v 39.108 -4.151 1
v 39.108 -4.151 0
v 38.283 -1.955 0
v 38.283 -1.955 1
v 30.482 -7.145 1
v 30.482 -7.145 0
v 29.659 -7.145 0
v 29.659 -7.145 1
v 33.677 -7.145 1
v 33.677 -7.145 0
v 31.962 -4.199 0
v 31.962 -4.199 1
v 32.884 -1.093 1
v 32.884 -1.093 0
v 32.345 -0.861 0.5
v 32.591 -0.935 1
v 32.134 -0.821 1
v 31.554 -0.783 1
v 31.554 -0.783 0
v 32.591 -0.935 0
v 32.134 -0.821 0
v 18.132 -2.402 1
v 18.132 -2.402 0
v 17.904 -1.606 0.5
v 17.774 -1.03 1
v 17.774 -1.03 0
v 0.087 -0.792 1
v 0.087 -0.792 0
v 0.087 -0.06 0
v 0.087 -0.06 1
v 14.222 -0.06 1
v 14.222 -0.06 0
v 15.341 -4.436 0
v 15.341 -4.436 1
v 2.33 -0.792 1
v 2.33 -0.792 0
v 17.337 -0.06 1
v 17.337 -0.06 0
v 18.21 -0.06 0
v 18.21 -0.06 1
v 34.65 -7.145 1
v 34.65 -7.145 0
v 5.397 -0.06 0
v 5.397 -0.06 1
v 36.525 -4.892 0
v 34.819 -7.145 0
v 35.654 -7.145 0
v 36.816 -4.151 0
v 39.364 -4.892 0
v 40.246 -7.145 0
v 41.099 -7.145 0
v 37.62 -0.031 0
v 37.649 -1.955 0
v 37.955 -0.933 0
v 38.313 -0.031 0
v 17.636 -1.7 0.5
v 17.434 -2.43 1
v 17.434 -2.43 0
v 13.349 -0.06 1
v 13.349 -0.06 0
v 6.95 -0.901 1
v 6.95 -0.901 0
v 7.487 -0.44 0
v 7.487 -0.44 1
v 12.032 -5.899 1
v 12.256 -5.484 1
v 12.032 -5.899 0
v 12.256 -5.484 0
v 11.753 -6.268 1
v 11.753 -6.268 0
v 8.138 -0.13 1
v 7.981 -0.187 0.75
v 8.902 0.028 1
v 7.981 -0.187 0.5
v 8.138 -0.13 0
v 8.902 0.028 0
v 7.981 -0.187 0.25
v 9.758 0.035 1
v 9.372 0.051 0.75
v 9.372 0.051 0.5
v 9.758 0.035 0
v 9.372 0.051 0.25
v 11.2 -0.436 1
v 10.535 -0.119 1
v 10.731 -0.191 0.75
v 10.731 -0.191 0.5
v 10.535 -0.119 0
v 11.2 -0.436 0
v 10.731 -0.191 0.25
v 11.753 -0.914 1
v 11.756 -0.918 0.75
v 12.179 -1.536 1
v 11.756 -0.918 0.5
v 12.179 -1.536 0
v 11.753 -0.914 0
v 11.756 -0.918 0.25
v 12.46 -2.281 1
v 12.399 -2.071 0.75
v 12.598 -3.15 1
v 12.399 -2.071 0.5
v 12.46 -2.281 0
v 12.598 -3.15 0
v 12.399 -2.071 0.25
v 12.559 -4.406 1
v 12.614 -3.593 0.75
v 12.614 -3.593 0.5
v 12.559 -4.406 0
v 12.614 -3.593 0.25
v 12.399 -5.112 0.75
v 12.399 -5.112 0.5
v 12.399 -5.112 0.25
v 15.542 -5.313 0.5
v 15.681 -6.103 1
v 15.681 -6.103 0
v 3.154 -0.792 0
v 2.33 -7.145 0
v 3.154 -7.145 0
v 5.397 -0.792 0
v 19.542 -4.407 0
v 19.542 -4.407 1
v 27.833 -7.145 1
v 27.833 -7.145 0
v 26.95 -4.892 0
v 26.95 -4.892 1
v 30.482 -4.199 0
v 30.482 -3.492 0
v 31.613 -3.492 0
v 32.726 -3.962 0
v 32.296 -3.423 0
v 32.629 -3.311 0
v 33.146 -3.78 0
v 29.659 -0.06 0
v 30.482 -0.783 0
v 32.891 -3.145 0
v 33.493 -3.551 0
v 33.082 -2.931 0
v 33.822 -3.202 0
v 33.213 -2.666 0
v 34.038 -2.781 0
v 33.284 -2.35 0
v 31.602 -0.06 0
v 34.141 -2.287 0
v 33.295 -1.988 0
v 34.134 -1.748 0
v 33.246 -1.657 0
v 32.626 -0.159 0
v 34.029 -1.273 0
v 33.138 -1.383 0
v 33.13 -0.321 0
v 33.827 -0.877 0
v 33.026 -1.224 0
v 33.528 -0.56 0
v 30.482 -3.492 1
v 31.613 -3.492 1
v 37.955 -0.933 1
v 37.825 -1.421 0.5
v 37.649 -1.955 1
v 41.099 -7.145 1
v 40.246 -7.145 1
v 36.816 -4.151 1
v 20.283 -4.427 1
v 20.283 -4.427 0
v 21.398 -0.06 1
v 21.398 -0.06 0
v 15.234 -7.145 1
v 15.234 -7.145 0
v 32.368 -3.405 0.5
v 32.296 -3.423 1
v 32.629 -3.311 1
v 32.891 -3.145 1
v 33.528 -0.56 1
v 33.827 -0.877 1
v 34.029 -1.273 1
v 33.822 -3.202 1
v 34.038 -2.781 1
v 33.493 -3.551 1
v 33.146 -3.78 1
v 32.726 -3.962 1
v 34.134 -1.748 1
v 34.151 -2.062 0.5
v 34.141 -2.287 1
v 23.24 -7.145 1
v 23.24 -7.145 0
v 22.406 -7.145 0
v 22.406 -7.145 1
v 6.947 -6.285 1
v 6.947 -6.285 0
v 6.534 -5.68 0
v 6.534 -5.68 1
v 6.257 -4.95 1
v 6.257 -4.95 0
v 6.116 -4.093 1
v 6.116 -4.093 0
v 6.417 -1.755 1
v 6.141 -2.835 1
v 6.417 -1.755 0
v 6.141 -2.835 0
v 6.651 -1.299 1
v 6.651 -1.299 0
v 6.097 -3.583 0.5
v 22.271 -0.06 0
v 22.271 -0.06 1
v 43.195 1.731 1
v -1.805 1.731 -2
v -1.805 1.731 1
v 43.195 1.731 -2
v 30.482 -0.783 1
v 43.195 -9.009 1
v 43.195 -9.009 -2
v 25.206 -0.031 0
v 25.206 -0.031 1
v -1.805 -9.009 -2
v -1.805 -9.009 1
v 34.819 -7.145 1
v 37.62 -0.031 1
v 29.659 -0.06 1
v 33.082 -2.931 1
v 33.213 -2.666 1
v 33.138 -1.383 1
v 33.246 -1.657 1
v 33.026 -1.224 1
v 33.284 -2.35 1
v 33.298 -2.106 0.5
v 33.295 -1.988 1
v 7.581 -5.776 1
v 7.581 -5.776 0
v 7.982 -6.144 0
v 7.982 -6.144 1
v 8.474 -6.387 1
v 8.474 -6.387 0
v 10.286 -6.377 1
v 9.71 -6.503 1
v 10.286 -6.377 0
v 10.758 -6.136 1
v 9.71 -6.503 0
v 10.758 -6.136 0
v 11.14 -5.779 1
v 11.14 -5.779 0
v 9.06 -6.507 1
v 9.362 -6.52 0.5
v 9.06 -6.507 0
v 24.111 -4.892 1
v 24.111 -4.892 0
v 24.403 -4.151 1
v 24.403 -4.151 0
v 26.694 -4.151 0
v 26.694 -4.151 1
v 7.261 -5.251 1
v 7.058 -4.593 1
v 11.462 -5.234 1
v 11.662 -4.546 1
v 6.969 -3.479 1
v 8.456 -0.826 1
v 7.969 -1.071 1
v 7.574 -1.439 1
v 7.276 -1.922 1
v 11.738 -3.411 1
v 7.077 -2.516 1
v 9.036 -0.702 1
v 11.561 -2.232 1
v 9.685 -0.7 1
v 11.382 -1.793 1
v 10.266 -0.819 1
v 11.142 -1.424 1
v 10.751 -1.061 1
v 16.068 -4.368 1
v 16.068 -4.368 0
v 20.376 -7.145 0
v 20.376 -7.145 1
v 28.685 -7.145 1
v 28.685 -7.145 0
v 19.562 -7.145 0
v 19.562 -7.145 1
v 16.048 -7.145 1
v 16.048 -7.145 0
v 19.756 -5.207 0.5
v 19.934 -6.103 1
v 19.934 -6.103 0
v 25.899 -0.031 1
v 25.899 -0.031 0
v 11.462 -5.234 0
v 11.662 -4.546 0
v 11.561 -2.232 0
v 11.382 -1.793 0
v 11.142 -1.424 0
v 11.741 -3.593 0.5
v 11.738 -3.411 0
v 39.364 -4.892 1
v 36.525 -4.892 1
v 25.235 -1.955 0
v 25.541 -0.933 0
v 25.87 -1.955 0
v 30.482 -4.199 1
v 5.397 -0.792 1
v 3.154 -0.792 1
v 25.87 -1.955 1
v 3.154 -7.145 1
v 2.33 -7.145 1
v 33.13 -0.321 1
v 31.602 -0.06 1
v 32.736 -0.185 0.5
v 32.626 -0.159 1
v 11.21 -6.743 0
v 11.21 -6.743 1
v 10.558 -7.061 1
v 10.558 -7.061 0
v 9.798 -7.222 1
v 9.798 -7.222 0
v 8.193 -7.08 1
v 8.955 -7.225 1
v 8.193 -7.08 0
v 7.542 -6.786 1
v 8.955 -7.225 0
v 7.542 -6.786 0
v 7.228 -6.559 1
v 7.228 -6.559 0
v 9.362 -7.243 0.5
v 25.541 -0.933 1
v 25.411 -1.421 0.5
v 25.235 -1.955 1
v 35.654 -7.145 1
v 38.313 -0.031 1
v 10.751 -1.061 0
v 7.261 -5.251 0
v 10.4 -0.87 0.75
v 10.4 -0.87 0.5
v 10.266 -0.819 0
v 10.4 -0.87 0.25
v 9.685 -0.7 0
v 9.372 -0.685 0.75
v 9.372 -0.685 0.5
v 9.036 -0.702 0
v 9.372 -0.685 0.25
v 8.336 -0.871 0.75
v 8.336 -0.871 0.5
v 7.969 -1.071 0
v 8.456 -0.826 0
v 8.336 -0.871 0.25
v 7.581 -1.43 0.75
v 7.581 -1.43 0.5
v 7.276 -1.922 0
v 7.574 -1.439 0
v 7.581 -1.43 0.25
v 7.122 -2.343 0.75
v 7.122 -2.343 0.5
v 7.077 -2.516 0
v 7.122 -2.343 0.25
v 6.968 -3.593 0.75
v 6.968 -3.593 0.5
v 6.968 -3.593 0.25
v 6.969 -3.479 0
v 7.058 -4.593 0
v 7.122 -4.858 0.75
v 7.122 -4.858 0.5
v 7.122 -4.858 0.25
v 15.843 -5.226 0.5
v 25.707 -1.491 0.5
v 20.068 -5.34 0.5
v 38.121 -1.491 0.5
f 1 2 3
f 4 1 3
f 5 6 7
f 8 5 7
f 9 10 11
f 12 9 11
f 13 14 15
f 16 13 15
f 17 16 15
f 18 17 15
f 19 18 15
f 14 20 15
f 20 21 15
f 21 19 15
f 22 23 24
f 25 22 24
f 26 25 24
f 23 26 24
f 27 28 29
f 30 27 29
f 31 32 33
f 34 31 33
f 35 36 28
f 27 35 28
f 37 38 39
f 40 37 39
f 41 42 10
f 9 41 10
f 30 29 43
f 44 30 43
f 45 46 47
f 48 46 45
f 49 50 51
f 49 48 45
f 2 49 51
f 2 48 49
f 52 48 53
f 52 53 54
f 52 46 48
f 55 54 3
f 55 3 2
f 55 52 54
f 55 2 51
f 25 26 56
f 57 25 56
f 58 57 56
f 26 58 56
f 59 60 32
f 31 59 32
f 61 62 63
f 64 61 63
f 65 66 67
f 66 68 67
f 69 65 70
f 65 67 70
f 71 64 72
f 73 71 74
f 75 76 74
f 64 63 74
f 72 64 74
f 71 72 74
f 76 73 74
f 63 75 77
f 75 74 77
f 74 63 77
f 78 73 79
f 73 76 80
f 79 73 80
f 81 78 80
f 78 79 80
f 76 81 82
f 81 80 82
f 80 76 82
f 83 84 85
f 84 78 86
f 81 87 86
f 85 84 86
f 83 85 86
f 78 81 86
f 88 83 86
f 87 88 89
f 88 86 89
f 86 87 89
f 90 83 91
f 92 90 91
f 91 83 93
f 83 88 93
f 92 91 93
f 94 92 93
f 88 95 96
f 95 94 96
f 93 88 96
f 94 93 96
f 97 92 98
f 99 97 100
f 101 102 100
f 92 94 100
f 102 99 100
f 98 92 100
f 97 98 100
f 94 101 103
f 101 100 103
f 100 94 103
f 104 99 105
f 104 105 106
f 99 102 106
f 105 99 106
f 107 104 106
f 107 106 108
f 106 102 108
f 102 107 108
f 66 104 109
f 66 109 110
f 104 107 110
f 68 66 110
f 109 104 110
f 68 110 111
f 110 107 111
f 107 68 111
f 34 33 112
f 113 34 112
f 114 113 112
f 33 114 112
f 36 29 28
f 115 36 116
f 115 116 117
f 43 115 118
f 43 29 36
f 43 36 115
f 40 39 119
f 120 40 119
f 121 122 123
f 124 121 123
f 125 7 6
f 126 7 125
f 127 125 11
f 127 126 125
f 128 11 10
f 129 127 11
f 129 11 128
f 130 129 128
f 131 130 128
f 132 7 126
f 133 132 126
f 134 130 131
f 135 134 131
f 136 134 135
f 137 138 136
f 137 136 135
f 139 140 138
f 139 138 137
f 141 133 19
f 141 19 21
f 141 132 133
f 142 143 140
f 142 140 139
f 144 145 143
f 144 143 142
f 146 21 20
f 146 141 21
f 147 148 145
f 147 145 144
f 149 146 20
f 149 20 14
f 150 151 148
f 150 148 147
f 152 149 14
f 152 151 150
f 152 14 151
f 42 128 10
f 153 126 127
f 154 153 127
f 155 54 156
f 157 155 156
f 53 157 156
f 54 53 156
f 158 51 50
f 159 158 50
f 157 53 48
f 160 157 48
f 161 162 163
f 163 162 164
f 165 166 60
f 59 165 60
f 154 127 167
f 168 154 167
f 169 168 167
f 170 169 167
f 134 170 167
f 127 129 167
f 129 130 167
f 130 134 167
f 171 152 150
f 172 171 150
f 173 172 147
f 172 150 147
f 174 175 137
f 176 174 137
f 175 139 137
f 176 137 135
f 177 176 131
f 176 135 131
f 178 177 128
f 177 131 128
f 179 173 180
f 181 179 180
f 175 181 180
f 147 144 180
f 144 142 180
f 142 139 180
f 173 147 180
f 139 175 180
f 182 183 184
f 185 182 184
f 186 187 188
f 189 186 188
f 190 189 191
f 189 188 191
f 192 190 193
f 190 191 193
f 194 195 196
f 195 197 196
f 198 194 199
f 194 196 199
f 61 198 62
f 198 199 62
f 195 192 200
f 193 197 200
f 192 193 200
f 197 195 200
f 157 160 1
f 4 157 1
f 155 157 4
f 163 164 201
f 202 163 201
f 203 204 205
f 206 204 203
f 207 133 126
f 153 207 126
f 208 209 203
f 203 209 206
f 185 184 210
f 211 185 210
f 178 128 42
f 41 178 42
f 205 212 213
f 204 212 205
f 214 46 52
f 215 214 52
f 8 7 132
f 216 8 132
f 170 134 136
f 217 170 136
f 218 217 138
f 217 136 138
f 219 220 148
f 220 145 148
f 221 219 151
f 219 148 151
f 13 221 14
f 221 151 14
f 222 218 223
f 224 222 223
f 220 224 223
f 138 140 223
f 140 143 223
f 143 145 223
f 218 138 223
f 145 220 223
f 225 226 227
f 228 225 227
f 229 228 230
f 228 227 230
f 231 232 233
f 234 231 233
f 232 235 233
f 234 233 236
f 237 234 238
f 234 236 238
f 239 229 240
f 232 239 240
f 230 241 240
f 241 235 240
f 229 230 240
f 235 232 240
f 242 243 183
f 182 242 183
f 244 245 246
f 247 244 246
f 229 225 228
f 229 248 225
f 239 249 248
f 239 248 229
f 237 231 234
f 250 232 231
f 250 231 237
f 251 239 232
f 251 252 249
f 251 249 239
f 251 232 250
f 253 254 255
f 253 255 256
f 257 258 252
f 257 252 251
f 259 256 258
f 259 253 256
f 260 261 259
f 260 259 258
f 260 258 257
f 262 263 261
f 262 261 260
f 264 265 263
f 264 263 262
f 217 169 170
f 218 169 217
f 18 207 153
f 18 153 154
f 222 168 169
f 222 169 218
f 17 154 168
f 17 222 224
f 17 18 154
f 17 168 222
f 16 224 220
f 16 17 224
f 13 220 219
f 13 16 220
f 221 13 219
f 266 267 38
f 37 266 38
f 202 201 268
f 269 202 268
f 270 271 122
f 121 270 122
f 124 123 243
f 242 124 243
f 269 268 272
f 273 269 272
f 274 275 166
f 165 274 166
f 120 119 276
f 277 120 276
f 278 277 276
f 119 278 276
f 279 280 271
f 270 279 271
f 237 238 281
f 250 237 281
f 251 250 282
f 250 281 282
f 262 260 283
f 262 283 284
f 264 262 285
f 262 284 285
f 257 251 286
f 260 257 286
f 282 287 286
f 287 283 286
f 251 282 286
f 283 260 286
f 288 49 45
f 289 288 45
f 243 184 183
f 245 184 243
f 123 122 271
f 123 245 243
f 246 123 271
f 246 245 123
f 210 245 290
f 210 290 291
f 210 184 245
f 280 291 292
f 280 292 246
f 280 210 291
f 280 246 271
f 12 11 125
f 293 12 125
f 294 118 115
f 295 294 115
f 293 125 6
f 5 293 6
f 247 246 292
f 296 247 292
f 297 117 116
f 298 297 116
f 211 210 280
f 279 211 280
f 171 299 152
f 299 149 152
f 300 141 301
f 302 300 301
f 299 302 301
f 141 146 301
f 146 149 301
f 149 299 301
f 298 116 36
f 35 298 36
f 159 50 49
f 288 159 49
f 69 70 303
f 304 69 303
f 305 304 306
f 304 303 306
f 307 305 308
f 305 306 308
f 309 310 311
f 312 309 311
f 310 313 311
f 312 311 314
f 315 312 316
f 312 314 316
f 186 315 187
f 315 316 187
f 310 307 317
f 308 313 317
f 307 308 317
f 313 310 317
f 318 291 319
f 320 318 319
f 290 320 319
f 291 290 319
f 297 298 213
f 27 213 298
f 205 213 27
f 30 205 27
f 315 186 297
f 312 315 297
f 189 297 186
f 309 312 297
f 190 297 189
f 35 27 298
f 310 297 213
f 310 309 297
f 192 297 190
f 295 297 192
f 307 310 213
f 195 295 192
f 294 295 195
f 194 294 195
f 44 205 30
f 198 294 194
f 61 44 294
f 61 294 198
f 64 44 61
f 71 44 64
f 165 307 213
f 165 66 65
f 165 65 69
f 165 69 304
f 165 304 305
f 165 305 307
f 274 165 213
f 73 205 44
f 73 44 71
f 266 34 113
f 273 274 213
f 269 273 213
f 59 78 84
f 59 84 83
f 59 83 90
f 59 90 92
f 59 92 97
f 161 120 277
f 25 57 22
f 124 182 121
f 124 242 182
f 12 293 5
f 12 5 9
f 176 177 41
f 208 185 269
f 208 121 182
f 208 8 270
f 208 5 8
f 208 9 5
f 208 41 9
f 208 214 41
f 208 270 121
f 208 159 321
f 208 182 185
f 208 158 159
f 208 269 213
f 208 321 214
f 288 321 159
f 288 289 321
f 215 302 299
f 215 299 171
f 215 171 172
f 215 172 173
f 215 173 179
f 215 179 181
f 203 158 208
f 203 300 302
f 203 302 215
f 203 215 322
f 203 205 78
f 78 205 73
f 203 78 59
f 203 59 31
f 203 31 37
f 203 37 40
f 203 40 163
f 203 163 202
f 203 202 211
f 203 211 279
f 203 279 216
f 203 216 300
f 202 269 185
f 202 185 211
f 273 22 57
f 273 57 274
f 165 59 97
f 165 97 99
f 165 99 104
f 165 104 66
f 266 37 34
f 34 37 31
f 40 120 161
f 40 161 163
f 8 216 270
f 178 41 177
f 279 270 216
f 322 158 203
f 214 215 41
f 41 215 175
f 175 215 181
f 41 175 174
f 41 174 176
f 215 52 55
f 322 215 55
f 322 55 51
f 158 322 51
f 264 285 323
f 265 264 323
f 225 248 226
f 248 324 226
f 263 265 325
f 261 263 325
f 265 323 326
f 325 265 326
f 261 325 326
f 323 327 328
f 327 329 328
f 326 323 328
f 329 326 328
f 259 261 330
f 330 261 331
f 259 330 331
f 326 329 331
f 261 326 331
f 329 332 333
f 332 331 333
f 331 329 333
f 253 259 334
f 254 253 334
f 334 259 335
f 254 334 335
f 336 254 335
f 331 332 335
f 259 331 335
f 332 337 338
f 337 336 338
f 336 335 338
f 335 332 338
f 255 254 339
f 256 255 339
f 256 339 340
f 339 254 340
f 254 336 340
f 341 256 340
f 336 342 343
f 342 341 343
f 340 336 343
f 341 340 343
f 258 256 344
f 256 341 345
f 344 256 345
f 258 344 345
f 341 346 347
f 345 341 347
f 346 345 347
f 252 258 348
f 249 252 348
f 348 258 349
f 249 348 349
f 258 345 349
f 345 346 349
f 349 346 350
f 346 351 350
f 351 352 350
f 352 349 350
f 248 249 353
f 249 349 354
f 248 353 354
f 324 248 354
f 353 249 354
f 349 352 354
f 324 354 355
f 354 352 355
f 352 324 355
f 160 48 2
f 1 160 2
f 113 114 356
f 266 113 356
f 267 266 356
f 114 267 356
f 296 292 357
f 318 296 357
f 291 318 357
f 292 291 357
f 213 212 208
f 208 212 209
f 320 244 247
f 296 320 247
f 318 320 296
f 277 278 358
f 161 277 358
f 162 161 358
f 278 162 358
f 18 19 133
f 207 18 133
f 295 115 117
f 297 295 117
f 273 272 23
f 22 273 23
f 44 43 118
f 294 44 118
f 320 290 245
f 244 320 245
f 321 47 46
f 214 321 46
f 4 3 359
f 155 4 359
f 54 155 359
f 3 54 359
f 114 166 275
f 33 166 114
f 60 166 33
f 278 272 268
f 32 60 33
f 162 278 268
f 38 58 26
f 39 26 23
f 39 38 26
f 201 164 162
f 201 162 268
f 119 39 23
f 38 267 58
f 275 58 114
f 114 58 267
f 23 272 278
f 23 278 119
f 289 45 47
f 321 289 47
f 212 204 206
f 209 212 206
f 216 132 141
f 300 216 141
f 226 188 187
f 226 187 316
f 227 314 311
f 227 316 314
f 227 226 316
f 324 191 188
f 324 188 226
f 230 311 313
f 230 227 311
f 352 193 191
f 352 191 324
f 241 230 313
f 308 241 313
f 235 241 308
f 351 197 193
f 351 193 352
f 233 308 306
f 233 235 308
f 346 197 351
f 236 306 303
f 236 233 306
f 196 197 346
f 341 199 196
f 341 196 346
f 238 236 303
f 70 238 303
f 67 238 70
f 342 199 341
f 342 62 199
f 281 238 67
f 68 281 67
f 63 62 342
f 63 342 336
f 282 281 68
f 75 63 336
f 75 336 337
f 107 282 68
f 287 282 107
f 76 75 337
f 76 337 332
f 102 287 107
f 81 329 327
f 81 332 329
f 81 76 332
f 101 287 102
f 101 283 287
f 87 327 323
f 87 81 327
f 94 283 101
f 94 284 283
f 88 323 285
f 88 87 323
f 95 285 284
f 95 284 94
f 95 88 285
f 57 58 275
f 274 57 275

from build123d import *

# Parameters (mm, degrees)
F2_W     = 45
F2_H     = 10.7396448086
F3_DEPTH = 2
F0_W     = 45
F0_H     = 10.7396448086
F4_DEPTH = 1


with BuildPart() as f3:
    # F2 (on offset) → F3 (new body)
    with BuildSketch(Plane.XY.offset(-2)):
        with Locations((20.6953600791, -3.6390531603)):
            Rectangle(F2_W, F2_H)
    extrude(amount=F3_DEPTH)

    # F0 (on Top) → F4 (join)
    with BuildSketch(Plane.XY):
        with Locations((20.6953600791, -3.6390531603)):
            Rectangle(F0_W, F0_H)
        Polygon((3.1538346612, -0.7923350599), (3.1538346612, -7.1449705598), (2.3304884443, -7.1449705598), (2.3304884443, -0.7923350599), (0.0868312394, -0.7923350599), (0.0868312394, -0.060471756), (5.397491866, -0.060471756), (5.397491866, -0.7923350599), align=None, mode=Mode.SUBTRACT)
        with BuildLine():
            add(Edge.make_bspline(
                [(11.7563295973, -0.9179302455), (12.6137880868, -1.8870289), (12.6137880868, -3.5926425319)],
                knots=[0, 0, 0, 1, 1, 1], degree=2))
            add(Edge.make_bspline(
                [(12.6137880868, -3.5926425319), (12.6137880868, -5.2936044903), (11.7532284816, -6.2681300972)],
                knots=[0, 0, 0, 1, 1, 1], degree=2))
            add(Edge.make_bspline(
                [(11.7532284816, -6.2681300972), (10.8926688764, -7.2426557042), (9.3622682813, -7.2426557042)],
                knots=[0, 0, 0, 1, 1, 1], degree=2))
            add(Edge.make_bspline(
                [(9.3622682813, -7.2426557042), (7.7977554135, -7.2426557042), (6.9472744343, -6.2851862335)],
                knots=[0, 0, 0, 1, 1, 1], degree=2))
            add(Edge.make_bspline(
                [(6.9472744343, -6.2851862335), (6.0967934551, -5.3277167629), (6.0967934551, -3.5833391848)],
                knots=[0, 0, 0, 1, 1, 1], degree=2))
            add(Edge.make_bspline(
                [(6.0967934551, -3.5833391848), (6.0967934551, -1.8529166274), (6.9496002711, -0.9008741092)],
                knots=[0, 0, 0, 1, 1, 1], degree=2))
            add(Edge.make_bspline(
                [(6.9496002711, -0.9008741092), (7.802407087, 0.051168409), (9.3715716284, 0.051168409)],
                knots=[0, 0, 0, 1, 1, 1], degree=2))
            add(Edge.make_bspline(
                [(9.3715716284, 0.051168409), (10.8988711078, 0.051168409), (11.7563295973, -0.9179302455)],
                knots=[0, 0, 0, 1, 1, 1], degree=2))
        make_face(mode=Mode.SUBTRACT)
        with BuildLine():
            Line((22.2706623591, -0.060471756), (20.3758806698, -7.1449705598))
            Line((20.3758806698, -7.1449705598), (19.5618378, -7.1449705598))
            Line((19.5618378, -7.1449705598), (18.1322234649, -2.4018141053))
            add(Edge.make_bspline(
                [(18.1322234649, -2.4018141053), (18.029886647, -2.0855003045), (17.9042914614, -1.6063779297)],
                knots=[0, 0, 0, 1, 1, 1], degree=2))
            add(Edge.make_bspline(
                [(17.9042914614, -1.6063779297), (17.7786962758, -1.1272555549), (17.7740446022, -1.0295704105)],
                knots=[0, 0, 0, 1, 1, 1], degree=2))
            add(Edge.make_bspline(
                [(17.7740446022, -1.0295704105), (17.6670561108, -1.6699508014), (17.4344724337, -2.4297241465)],
                knots=[0, 0, 0, 1, 1, 1], degree=2))
            Line((17.4344724337, -2.4297241465), (16.0482737183, -7.1449705598))
            Line((16.0482737183, -7.1449705598), (15.2342308486, -7.1449705598))
            Line((15.2342308486, -7.1449705598), (13.3487525064, -0.060471756))
            Line((13.3487525064, -0.060471756), (14.2217165743, -0.060471756))
            Line((14.2217165743, -0.060471756), (15.34121934, -4.4361460008))
            add(Edge.make_bspline(
                [(15.34121934, -4.4361460008), (15.5738030171, -5.357177362), (15.6807915085, -6.1029956865)],
                knots=[0, 0, 0, 1, 1, 1], degree=2))
            add(Edge.make_bspline(
                [(15.6807915085, -6.1029956865), (15.8110383677, -5.2160765979), (16.0684309703, -4.3679214555)],
                knots=[0, 0, 0, 1, 1, 1], degree=2))
            Line((16.0684309703, -4.3679214555), (17.3367872893, -0.060471756))
            Line((17.3367872893, -0.060471756), (18.2097513573, -0.060471756))
            Line((18.2097513573, -0.060471756), (19.541680548, -4.4066854017))
            add(Edge.make_bspline(
                [(19.541680548, -4.4066854017), (19.7742642251, -5.1587059576), (19.9339716834, -6.1029956865)],
                knots=[0, 0, 0, 1, 1, 1], degree=2))
            add(Edge.make_bspline(
                [(19.9339716834, -6.1029956865), (20.0270051542, -5.4145480024), (20.282847199, -4.4268426537)],
                knots=[0, 0, 0, 1, 1, 1], degree=2))
            Line((20.282847199, -4.4268426537), (21.3976982911, -0.060471756))
            Line((21.3976982911, -0.060471756), (22.2706623591, -0.060471756))
        make_face(mode=Mode.SUBTRACT)
        Polygon((28.6853201729, -7.1449705598), (27.8325133569, -7.1449705598), (26.9502459419, -4.8920100079), (24.1111745237, -4.8920100079), (23.2397610136, -7.1449705598), (22.4055608918, -7.1449705598), (25.2058683638, -0.0310111569), (25.8989677215, -0.0310111569), align=None, mode=Mode.SUBTRACT)
        with BuildLine():
            Line((31.961648904, -4.1989106502), (30.4824167177, -4.1989106502))
            Line((30.4824167177, -4.1989106502), (30.4824167177, -7.1449705598))
            Line((30.4824167177, -7.1449705598), (29.6590705009, -7.1449705598))
            Line((29.6590705009, -7.1449705598), (29.6590705009, -0.060471756))
            Line((29.6590705009, -0.060471756), (31.6019194834, -0.060471756))
            add(Edge.make_bspline(
                [(31.6019194834, -0.060471756), (32.9059386329, -0.060471756), (33.5284876085, -0.5597513828)],
                knots=[0, 0, 0, 1, 1, 1], degree=2))
            add(Edge.make_bspline(
                [(33.5284876085, -0.5597513828), (34.1510365842, -1.0590310096), (34.1510365842, -2.0622419368)],
                knots=[0, 0, 0, 1, 1, 1], degree=2))
            add(Edge.make_bspline(
                [(34.1510365842, -2.0622419368), (34.1510365842, -3.4670473463), (32.7260739226, -3.9616752995)],
                knots=[0, 0, 0, 1, 1, 1], degree=2))
            Line((32.7260739226, -3.9616752995), (34.650316211, -7.1449705598))
            Line((34.650316211, -7.1449705598), (33.6765658829, -7.1449705598))
            Line((33.6765658829, -7.1449705598), (31.961648904, -4.1989106502))
        make_face(mode=Mode.SUBTRACT)
        Polygon((41.0990862974, -7.1449705598), (40.2462794814, -7.1449705598), (39.3640120664, -4.8920100079), (36.5249406482, -4.8920100079), (35.6535271381, -7.1449705598), (34.8193270163, -7.1449705598), (37.6196344883, -0.0310111569), (38.312733846, -0.0310111569), align=None, mode=Mode.SUBTRACT)
        with BuildLine():
            add(Edge.make_bspline(
                [(7.5814525938, -1.4296143351), (6.9682069652, -2.1738821017), (6.9682069652, -3.5926425319)],
                knots=[0, 0, 0, 1, 1, 1], degree=2))
            add(Edge.make_bspline(
                [(6.9682069652, -3.5926425319), (6.9682069652, -5.0315602141), (7.5814525938, -5.7758279808)],
                knots=[0, 0, 0, 1, 1, 1], degree=2))
            add(Edge.make_bspline(
                [(7.5814525938, -5.7758279808), (8.1946982224, -6.5200957474), (9.3622682813, -6.5200957474)],
                knots=[0, 0, 0, 1, 1, 1], degree=2))
            add(Edge.make_bspline(
                [(9.3622682813, -6.5200957474), (10.5391416873, -6.5200957474), (11.1399828531, -5.7789290964)],
                knots=[0, 0, 0, 1, 1, 1], degree=2))
            add(Edge.make_bspline(
                [(11.1399828531, -5.7789290964), (11.7408240189, -5.0377624455), (11.7408240189, -3.5926425319)],
                knots=[0, 0, 0, 1, 1, 1], degree=2))
            add(Edge.make_bspline(
                [(11.7408240189, -3.5926425319), (11.7408240189, -2.1630281968), (11.1423086898, -1.4241873826)],
                knots=[0, 0, 0, 1, 1, 1], degree=2))
            add(Edge.make_bspline(
                [(11.1423086898, -1.4241873826), (10.5437933608, -0.6853465685), (9.3715716284, -0.6853465685)],
                knots=[0, 0, 0, 1, 1, 1], degree=2))
            add(Edge.make_bspline(
                [(9.3715716284, -0.6853465685), (8.1946982224, -0.6853465685), (7.5814525938, -1.4296143351)],
                knots=[0, 0, 0, 1, 1, 1], degree=2))
        make_face()
        with BuildLine():
            Line((24.4026793989, -4.1508433569), (26.6944038971, -4.1508433569))
            Line((26.6944038971, -4.1508433569), (25.8695071224, -1.9552534453))
            add(Edge.make_bspline(
                [(25.8695071224, -1.9552534453), (25.7097996641, -1.5381533844), (25.5407888588, -0.933435824)],
                knots=[0, 0, 0, 1, 1, 1], degree=2))
            add(Edge.make_bspline(
                [(25.5407888588, -0.933435824), (25.4338003673, -1.3986031782), (25.2353289629, -1.9552534453)],
                knots=[0, 0, 0, 1, 1, 1], degree=2))
            Line((25.2353289629, -1.9552534453), (24.4026793989, -4.1508433569))
        make_face()
        with BuildLine():
            Line((30.4824167177, -0.7830317128), (30.4824167177, -3.4918562719))
            Line((30.4824167177, -3.4918562719), (31.6127733883, -3.4918562719))
            add(Edge.make_bspline(
                [(31.6127733883, -3.4918562719), (32.4841868985, -3.4918562719), (32.8912083333, -3.145306593)],
                knots=[0, 0, 0, 1, 1, 1], degree=2))
            add(Edge.make_bspline(
                [(32.8912083333, -3.145306593), (33.2982297682, -2.7987569142), (33.2982297682, -2.1056575565)],
                knots=[0, 0, 0, 1, 1, 1], degree=2))
            add(Edge.make_bspline(
                [(33.2982297682, -2.1056575565), (33.2982297682, -1.4032548517), (32.884230823, -1.0931432823)],
                knots=[0, 0, 0, 1, 1, 1], degree=2))
            add(Edge.make_bspline(
                [(32.884230823, -1.0931432823), (32.4702318778, -0.7830317128), (31.5538521901, -0.7830317128)],
                knots=[0, 0, 0, 1, 1, 1], degree=2))
            Line((31.5538521901, -0.7830317128), (30.4824167177, -0.7830317128))
        make_face()
        with BuildLine():
            Line((36.8164455235, -4.1508433569), (39.1081700216, -4.1508433569))
            Line((39.1081700216, -4.1508433569), (38.2832732469, -1.9552534453))
            add(Edge.make_bspline(
                [(38.2832732469, -1.9552534453), (38.1235657886, -1.5381533844), (37.9545549833, -0.933435824)],
                knots=[0, 0, 0, 1, 1, 1], degree=2))
            add(Edge.make_bspline(
                [(37.9545549833, -0.933435824), (37.8475664919, -1.3986031782), (37.6490950874, -1.9552534453)],
                knots=[0, 0, 0, 1, 1, 1], degree=2))
            Line((37.6490950874, -1.9552534453), (36.8164455235, -4.1508433569))
        make_face()
    extrude(amount=F4_DEPTH)


solid = f3.part
